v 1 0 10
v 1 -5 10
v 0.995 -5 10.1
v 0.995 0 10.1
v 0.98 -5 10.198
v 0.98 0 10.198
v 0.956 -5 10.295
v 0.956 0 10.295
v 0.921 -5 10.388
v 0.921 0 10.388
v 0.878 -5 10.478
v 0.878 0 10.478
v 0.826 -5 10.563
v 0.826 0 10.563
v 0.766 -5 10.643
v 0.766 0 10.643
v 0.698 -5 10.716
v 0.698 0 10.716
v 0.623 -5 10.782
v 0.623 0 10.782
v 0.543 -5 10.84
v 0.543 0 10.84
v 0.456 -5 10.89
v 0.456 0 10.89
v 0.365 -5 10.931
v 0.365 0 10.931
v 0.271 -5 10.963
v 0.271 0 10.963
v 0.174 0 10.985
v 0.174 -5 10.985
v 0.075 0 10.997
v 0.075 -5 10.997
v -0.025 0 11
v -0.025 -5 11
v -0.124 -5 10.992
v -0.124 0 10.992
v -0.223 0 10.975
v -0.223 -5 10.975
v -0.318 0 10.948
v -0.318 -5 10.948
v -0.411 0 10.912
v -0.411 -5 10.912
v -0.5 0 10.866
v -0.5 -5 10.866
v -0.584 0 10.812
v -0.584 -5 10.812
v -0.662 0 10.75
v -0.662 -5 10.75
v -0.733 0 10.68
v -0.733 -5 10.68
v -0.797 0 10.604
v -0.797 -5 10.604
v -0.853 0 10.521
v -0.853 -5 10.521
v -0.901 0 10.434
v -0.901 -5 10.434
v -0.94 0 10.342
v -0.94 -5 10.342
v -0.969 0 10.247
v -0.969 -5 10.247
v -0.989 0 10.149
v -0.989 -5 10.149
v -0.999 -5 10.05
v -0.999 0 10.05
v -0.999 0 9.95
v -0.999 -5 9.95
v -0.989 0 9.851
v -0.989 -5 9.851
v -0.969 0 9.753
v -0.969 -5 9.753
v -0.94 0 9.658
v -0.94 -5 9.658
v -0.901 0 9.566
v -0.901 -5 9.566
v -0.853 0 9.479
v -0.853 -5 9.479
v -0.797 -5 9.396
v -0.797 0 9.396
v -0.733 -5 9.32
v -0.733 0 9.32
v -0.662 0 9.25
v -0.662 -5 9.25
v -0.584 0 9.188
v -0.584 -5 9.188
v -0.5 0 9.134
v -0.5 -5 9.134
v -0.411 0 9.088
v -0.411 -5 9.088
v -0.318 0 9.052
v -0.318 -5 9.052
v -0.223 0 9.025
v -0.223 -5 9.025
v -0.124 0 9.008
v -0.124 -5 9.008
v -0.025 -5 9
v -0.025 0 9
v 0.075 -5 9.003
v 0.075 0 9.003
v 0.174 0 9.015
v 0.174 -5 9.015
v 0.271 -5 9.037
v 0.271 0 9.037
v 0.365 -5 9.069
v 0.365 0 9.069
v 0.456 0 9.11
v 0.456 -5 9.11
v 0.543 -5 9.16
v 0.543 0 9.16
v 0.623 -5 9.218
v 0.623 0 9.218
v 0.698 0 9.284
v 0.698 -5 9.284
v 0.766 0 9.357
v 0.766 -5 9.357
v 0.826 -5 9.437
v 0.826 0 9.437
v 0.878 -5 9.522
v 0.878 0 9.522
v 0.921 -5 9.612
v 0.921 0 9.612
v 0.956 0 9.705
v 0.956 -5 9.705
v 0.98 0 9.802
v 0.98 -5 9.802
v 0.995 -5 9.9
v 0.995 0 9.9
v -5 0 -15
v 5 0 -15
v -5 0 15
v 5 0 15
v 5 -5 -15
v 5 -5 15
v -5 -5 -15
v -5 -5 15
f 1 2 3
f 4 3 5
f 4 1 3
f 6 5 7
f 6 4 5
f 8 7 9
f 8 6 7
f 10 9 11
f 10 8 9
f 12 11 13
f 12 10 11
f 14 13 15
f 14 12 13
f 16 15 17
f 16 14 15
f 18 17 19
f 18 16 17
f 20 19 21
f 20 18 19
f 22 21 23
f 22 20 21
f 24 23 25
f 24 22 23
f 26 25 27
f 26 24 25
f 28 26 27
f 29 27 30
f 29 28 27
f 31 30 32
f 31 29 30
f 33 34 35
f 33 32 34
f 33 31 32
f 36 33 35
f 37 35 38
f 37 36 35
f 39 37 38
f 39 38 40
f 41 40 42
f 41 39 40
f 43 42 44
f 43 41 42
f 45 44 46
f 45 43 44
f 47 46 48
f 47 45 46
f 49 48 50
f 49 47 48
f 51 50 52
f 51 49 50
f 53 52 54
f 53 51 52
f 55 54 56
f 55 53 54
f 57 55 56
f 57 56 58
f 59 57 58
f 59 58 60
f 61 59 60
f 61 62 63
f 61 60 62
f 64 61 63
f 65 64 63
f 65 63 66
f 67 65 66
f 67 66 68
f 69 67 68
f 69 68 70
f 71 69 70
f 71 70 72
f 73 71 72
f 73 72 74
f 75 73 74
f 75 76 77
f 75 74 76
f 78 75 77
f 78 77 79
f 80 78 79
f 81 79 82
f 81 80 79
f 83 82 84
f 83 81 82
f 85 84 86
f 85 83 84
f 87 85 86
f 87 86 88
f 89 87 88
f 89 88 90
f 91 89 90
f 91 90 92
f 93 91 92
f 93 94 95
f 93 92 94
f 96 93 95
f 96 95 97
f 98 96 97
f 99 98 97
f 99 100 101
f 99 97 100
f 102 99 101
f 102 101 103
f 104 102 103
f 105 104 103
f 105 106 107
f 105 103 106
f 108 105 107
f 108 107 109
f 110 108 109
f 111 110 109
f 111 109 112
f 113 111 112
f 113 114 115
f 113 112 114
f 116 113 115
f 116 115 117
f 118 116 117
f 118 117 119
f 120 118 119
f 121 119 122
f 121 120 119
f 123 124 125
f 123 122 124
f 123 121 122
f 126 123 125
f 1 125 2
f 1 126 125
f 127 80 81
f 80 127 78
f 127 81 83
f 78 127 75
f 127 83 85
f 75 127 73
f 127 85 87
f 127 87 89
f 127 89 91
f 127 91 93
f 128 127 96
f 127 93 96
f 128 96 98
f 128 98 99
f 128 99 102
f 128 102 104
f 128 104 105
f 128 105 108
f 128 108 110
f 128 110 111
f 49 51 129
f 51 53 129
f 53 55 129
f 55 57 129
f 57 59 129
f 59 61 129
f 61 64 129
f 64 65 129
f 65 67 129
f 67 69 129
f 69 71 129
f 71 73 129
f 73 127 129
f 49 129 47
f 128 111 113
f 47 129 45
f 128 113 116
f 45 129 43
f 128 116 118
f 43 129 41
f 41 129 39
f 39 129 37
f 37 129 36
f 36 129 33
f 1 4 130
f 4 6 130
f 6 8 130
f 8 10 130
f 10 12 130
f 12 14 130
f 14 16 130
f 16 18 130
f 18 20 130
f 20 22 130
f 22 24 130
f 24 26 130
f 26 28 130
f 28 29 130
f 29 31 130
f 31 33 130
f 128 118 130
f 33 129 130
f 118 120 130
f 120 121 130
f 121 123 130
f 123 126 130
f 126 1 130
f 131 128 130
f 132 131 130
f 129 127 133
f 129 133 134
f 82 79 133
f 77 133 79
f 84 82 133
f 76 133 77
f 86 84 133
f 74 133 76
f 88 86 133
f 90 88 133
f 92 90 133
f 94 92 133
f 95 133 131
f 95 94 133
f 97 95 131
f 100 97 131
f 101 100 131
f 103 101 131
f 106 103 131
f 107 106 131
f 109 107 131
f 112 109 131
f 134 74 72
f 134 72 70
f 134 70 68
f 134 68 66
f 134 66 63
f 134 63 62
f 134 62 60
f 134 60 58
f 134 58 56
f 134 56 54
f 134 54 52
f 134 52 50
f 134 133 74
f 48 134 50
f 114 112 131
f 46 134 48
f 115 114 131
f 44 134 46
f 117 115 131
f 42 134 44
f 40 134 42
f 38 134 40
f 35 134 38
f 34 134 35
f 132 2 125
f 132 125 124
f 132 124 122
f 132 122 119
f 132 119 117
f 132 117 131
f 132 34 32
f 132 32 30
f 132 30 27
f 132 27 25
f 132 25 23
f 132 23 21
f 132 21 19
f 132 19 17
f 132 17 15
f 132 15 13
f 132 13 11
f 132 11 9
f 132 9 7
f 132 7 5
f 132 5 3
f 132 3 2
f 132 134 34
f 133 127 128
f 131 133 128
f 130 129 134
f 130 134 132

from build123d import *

# Parameters (mm, degrees)
F0_W     = 10
F0_H     = 30
F1_DEPTH = 5
F2_R     = 1
F3_DEPTH = 10


with BuildPart() as f1:
    # F0 (on Front) → F1 (new body)
    with BuildSketch(Plane.XZ):
        Rectangle(F0_W, F0_H)
    extrude(amount=F1_DEPTH)

    # F2 (on Front) → F3 (cut)
    with BuildSketch(Plane.XZ):
        with Locations((0, 10)):
            Circle(F2_R)
    extrude(amount=F3_DEPTH, mode=Mode.SUBTRACT)


solid = f1.part
